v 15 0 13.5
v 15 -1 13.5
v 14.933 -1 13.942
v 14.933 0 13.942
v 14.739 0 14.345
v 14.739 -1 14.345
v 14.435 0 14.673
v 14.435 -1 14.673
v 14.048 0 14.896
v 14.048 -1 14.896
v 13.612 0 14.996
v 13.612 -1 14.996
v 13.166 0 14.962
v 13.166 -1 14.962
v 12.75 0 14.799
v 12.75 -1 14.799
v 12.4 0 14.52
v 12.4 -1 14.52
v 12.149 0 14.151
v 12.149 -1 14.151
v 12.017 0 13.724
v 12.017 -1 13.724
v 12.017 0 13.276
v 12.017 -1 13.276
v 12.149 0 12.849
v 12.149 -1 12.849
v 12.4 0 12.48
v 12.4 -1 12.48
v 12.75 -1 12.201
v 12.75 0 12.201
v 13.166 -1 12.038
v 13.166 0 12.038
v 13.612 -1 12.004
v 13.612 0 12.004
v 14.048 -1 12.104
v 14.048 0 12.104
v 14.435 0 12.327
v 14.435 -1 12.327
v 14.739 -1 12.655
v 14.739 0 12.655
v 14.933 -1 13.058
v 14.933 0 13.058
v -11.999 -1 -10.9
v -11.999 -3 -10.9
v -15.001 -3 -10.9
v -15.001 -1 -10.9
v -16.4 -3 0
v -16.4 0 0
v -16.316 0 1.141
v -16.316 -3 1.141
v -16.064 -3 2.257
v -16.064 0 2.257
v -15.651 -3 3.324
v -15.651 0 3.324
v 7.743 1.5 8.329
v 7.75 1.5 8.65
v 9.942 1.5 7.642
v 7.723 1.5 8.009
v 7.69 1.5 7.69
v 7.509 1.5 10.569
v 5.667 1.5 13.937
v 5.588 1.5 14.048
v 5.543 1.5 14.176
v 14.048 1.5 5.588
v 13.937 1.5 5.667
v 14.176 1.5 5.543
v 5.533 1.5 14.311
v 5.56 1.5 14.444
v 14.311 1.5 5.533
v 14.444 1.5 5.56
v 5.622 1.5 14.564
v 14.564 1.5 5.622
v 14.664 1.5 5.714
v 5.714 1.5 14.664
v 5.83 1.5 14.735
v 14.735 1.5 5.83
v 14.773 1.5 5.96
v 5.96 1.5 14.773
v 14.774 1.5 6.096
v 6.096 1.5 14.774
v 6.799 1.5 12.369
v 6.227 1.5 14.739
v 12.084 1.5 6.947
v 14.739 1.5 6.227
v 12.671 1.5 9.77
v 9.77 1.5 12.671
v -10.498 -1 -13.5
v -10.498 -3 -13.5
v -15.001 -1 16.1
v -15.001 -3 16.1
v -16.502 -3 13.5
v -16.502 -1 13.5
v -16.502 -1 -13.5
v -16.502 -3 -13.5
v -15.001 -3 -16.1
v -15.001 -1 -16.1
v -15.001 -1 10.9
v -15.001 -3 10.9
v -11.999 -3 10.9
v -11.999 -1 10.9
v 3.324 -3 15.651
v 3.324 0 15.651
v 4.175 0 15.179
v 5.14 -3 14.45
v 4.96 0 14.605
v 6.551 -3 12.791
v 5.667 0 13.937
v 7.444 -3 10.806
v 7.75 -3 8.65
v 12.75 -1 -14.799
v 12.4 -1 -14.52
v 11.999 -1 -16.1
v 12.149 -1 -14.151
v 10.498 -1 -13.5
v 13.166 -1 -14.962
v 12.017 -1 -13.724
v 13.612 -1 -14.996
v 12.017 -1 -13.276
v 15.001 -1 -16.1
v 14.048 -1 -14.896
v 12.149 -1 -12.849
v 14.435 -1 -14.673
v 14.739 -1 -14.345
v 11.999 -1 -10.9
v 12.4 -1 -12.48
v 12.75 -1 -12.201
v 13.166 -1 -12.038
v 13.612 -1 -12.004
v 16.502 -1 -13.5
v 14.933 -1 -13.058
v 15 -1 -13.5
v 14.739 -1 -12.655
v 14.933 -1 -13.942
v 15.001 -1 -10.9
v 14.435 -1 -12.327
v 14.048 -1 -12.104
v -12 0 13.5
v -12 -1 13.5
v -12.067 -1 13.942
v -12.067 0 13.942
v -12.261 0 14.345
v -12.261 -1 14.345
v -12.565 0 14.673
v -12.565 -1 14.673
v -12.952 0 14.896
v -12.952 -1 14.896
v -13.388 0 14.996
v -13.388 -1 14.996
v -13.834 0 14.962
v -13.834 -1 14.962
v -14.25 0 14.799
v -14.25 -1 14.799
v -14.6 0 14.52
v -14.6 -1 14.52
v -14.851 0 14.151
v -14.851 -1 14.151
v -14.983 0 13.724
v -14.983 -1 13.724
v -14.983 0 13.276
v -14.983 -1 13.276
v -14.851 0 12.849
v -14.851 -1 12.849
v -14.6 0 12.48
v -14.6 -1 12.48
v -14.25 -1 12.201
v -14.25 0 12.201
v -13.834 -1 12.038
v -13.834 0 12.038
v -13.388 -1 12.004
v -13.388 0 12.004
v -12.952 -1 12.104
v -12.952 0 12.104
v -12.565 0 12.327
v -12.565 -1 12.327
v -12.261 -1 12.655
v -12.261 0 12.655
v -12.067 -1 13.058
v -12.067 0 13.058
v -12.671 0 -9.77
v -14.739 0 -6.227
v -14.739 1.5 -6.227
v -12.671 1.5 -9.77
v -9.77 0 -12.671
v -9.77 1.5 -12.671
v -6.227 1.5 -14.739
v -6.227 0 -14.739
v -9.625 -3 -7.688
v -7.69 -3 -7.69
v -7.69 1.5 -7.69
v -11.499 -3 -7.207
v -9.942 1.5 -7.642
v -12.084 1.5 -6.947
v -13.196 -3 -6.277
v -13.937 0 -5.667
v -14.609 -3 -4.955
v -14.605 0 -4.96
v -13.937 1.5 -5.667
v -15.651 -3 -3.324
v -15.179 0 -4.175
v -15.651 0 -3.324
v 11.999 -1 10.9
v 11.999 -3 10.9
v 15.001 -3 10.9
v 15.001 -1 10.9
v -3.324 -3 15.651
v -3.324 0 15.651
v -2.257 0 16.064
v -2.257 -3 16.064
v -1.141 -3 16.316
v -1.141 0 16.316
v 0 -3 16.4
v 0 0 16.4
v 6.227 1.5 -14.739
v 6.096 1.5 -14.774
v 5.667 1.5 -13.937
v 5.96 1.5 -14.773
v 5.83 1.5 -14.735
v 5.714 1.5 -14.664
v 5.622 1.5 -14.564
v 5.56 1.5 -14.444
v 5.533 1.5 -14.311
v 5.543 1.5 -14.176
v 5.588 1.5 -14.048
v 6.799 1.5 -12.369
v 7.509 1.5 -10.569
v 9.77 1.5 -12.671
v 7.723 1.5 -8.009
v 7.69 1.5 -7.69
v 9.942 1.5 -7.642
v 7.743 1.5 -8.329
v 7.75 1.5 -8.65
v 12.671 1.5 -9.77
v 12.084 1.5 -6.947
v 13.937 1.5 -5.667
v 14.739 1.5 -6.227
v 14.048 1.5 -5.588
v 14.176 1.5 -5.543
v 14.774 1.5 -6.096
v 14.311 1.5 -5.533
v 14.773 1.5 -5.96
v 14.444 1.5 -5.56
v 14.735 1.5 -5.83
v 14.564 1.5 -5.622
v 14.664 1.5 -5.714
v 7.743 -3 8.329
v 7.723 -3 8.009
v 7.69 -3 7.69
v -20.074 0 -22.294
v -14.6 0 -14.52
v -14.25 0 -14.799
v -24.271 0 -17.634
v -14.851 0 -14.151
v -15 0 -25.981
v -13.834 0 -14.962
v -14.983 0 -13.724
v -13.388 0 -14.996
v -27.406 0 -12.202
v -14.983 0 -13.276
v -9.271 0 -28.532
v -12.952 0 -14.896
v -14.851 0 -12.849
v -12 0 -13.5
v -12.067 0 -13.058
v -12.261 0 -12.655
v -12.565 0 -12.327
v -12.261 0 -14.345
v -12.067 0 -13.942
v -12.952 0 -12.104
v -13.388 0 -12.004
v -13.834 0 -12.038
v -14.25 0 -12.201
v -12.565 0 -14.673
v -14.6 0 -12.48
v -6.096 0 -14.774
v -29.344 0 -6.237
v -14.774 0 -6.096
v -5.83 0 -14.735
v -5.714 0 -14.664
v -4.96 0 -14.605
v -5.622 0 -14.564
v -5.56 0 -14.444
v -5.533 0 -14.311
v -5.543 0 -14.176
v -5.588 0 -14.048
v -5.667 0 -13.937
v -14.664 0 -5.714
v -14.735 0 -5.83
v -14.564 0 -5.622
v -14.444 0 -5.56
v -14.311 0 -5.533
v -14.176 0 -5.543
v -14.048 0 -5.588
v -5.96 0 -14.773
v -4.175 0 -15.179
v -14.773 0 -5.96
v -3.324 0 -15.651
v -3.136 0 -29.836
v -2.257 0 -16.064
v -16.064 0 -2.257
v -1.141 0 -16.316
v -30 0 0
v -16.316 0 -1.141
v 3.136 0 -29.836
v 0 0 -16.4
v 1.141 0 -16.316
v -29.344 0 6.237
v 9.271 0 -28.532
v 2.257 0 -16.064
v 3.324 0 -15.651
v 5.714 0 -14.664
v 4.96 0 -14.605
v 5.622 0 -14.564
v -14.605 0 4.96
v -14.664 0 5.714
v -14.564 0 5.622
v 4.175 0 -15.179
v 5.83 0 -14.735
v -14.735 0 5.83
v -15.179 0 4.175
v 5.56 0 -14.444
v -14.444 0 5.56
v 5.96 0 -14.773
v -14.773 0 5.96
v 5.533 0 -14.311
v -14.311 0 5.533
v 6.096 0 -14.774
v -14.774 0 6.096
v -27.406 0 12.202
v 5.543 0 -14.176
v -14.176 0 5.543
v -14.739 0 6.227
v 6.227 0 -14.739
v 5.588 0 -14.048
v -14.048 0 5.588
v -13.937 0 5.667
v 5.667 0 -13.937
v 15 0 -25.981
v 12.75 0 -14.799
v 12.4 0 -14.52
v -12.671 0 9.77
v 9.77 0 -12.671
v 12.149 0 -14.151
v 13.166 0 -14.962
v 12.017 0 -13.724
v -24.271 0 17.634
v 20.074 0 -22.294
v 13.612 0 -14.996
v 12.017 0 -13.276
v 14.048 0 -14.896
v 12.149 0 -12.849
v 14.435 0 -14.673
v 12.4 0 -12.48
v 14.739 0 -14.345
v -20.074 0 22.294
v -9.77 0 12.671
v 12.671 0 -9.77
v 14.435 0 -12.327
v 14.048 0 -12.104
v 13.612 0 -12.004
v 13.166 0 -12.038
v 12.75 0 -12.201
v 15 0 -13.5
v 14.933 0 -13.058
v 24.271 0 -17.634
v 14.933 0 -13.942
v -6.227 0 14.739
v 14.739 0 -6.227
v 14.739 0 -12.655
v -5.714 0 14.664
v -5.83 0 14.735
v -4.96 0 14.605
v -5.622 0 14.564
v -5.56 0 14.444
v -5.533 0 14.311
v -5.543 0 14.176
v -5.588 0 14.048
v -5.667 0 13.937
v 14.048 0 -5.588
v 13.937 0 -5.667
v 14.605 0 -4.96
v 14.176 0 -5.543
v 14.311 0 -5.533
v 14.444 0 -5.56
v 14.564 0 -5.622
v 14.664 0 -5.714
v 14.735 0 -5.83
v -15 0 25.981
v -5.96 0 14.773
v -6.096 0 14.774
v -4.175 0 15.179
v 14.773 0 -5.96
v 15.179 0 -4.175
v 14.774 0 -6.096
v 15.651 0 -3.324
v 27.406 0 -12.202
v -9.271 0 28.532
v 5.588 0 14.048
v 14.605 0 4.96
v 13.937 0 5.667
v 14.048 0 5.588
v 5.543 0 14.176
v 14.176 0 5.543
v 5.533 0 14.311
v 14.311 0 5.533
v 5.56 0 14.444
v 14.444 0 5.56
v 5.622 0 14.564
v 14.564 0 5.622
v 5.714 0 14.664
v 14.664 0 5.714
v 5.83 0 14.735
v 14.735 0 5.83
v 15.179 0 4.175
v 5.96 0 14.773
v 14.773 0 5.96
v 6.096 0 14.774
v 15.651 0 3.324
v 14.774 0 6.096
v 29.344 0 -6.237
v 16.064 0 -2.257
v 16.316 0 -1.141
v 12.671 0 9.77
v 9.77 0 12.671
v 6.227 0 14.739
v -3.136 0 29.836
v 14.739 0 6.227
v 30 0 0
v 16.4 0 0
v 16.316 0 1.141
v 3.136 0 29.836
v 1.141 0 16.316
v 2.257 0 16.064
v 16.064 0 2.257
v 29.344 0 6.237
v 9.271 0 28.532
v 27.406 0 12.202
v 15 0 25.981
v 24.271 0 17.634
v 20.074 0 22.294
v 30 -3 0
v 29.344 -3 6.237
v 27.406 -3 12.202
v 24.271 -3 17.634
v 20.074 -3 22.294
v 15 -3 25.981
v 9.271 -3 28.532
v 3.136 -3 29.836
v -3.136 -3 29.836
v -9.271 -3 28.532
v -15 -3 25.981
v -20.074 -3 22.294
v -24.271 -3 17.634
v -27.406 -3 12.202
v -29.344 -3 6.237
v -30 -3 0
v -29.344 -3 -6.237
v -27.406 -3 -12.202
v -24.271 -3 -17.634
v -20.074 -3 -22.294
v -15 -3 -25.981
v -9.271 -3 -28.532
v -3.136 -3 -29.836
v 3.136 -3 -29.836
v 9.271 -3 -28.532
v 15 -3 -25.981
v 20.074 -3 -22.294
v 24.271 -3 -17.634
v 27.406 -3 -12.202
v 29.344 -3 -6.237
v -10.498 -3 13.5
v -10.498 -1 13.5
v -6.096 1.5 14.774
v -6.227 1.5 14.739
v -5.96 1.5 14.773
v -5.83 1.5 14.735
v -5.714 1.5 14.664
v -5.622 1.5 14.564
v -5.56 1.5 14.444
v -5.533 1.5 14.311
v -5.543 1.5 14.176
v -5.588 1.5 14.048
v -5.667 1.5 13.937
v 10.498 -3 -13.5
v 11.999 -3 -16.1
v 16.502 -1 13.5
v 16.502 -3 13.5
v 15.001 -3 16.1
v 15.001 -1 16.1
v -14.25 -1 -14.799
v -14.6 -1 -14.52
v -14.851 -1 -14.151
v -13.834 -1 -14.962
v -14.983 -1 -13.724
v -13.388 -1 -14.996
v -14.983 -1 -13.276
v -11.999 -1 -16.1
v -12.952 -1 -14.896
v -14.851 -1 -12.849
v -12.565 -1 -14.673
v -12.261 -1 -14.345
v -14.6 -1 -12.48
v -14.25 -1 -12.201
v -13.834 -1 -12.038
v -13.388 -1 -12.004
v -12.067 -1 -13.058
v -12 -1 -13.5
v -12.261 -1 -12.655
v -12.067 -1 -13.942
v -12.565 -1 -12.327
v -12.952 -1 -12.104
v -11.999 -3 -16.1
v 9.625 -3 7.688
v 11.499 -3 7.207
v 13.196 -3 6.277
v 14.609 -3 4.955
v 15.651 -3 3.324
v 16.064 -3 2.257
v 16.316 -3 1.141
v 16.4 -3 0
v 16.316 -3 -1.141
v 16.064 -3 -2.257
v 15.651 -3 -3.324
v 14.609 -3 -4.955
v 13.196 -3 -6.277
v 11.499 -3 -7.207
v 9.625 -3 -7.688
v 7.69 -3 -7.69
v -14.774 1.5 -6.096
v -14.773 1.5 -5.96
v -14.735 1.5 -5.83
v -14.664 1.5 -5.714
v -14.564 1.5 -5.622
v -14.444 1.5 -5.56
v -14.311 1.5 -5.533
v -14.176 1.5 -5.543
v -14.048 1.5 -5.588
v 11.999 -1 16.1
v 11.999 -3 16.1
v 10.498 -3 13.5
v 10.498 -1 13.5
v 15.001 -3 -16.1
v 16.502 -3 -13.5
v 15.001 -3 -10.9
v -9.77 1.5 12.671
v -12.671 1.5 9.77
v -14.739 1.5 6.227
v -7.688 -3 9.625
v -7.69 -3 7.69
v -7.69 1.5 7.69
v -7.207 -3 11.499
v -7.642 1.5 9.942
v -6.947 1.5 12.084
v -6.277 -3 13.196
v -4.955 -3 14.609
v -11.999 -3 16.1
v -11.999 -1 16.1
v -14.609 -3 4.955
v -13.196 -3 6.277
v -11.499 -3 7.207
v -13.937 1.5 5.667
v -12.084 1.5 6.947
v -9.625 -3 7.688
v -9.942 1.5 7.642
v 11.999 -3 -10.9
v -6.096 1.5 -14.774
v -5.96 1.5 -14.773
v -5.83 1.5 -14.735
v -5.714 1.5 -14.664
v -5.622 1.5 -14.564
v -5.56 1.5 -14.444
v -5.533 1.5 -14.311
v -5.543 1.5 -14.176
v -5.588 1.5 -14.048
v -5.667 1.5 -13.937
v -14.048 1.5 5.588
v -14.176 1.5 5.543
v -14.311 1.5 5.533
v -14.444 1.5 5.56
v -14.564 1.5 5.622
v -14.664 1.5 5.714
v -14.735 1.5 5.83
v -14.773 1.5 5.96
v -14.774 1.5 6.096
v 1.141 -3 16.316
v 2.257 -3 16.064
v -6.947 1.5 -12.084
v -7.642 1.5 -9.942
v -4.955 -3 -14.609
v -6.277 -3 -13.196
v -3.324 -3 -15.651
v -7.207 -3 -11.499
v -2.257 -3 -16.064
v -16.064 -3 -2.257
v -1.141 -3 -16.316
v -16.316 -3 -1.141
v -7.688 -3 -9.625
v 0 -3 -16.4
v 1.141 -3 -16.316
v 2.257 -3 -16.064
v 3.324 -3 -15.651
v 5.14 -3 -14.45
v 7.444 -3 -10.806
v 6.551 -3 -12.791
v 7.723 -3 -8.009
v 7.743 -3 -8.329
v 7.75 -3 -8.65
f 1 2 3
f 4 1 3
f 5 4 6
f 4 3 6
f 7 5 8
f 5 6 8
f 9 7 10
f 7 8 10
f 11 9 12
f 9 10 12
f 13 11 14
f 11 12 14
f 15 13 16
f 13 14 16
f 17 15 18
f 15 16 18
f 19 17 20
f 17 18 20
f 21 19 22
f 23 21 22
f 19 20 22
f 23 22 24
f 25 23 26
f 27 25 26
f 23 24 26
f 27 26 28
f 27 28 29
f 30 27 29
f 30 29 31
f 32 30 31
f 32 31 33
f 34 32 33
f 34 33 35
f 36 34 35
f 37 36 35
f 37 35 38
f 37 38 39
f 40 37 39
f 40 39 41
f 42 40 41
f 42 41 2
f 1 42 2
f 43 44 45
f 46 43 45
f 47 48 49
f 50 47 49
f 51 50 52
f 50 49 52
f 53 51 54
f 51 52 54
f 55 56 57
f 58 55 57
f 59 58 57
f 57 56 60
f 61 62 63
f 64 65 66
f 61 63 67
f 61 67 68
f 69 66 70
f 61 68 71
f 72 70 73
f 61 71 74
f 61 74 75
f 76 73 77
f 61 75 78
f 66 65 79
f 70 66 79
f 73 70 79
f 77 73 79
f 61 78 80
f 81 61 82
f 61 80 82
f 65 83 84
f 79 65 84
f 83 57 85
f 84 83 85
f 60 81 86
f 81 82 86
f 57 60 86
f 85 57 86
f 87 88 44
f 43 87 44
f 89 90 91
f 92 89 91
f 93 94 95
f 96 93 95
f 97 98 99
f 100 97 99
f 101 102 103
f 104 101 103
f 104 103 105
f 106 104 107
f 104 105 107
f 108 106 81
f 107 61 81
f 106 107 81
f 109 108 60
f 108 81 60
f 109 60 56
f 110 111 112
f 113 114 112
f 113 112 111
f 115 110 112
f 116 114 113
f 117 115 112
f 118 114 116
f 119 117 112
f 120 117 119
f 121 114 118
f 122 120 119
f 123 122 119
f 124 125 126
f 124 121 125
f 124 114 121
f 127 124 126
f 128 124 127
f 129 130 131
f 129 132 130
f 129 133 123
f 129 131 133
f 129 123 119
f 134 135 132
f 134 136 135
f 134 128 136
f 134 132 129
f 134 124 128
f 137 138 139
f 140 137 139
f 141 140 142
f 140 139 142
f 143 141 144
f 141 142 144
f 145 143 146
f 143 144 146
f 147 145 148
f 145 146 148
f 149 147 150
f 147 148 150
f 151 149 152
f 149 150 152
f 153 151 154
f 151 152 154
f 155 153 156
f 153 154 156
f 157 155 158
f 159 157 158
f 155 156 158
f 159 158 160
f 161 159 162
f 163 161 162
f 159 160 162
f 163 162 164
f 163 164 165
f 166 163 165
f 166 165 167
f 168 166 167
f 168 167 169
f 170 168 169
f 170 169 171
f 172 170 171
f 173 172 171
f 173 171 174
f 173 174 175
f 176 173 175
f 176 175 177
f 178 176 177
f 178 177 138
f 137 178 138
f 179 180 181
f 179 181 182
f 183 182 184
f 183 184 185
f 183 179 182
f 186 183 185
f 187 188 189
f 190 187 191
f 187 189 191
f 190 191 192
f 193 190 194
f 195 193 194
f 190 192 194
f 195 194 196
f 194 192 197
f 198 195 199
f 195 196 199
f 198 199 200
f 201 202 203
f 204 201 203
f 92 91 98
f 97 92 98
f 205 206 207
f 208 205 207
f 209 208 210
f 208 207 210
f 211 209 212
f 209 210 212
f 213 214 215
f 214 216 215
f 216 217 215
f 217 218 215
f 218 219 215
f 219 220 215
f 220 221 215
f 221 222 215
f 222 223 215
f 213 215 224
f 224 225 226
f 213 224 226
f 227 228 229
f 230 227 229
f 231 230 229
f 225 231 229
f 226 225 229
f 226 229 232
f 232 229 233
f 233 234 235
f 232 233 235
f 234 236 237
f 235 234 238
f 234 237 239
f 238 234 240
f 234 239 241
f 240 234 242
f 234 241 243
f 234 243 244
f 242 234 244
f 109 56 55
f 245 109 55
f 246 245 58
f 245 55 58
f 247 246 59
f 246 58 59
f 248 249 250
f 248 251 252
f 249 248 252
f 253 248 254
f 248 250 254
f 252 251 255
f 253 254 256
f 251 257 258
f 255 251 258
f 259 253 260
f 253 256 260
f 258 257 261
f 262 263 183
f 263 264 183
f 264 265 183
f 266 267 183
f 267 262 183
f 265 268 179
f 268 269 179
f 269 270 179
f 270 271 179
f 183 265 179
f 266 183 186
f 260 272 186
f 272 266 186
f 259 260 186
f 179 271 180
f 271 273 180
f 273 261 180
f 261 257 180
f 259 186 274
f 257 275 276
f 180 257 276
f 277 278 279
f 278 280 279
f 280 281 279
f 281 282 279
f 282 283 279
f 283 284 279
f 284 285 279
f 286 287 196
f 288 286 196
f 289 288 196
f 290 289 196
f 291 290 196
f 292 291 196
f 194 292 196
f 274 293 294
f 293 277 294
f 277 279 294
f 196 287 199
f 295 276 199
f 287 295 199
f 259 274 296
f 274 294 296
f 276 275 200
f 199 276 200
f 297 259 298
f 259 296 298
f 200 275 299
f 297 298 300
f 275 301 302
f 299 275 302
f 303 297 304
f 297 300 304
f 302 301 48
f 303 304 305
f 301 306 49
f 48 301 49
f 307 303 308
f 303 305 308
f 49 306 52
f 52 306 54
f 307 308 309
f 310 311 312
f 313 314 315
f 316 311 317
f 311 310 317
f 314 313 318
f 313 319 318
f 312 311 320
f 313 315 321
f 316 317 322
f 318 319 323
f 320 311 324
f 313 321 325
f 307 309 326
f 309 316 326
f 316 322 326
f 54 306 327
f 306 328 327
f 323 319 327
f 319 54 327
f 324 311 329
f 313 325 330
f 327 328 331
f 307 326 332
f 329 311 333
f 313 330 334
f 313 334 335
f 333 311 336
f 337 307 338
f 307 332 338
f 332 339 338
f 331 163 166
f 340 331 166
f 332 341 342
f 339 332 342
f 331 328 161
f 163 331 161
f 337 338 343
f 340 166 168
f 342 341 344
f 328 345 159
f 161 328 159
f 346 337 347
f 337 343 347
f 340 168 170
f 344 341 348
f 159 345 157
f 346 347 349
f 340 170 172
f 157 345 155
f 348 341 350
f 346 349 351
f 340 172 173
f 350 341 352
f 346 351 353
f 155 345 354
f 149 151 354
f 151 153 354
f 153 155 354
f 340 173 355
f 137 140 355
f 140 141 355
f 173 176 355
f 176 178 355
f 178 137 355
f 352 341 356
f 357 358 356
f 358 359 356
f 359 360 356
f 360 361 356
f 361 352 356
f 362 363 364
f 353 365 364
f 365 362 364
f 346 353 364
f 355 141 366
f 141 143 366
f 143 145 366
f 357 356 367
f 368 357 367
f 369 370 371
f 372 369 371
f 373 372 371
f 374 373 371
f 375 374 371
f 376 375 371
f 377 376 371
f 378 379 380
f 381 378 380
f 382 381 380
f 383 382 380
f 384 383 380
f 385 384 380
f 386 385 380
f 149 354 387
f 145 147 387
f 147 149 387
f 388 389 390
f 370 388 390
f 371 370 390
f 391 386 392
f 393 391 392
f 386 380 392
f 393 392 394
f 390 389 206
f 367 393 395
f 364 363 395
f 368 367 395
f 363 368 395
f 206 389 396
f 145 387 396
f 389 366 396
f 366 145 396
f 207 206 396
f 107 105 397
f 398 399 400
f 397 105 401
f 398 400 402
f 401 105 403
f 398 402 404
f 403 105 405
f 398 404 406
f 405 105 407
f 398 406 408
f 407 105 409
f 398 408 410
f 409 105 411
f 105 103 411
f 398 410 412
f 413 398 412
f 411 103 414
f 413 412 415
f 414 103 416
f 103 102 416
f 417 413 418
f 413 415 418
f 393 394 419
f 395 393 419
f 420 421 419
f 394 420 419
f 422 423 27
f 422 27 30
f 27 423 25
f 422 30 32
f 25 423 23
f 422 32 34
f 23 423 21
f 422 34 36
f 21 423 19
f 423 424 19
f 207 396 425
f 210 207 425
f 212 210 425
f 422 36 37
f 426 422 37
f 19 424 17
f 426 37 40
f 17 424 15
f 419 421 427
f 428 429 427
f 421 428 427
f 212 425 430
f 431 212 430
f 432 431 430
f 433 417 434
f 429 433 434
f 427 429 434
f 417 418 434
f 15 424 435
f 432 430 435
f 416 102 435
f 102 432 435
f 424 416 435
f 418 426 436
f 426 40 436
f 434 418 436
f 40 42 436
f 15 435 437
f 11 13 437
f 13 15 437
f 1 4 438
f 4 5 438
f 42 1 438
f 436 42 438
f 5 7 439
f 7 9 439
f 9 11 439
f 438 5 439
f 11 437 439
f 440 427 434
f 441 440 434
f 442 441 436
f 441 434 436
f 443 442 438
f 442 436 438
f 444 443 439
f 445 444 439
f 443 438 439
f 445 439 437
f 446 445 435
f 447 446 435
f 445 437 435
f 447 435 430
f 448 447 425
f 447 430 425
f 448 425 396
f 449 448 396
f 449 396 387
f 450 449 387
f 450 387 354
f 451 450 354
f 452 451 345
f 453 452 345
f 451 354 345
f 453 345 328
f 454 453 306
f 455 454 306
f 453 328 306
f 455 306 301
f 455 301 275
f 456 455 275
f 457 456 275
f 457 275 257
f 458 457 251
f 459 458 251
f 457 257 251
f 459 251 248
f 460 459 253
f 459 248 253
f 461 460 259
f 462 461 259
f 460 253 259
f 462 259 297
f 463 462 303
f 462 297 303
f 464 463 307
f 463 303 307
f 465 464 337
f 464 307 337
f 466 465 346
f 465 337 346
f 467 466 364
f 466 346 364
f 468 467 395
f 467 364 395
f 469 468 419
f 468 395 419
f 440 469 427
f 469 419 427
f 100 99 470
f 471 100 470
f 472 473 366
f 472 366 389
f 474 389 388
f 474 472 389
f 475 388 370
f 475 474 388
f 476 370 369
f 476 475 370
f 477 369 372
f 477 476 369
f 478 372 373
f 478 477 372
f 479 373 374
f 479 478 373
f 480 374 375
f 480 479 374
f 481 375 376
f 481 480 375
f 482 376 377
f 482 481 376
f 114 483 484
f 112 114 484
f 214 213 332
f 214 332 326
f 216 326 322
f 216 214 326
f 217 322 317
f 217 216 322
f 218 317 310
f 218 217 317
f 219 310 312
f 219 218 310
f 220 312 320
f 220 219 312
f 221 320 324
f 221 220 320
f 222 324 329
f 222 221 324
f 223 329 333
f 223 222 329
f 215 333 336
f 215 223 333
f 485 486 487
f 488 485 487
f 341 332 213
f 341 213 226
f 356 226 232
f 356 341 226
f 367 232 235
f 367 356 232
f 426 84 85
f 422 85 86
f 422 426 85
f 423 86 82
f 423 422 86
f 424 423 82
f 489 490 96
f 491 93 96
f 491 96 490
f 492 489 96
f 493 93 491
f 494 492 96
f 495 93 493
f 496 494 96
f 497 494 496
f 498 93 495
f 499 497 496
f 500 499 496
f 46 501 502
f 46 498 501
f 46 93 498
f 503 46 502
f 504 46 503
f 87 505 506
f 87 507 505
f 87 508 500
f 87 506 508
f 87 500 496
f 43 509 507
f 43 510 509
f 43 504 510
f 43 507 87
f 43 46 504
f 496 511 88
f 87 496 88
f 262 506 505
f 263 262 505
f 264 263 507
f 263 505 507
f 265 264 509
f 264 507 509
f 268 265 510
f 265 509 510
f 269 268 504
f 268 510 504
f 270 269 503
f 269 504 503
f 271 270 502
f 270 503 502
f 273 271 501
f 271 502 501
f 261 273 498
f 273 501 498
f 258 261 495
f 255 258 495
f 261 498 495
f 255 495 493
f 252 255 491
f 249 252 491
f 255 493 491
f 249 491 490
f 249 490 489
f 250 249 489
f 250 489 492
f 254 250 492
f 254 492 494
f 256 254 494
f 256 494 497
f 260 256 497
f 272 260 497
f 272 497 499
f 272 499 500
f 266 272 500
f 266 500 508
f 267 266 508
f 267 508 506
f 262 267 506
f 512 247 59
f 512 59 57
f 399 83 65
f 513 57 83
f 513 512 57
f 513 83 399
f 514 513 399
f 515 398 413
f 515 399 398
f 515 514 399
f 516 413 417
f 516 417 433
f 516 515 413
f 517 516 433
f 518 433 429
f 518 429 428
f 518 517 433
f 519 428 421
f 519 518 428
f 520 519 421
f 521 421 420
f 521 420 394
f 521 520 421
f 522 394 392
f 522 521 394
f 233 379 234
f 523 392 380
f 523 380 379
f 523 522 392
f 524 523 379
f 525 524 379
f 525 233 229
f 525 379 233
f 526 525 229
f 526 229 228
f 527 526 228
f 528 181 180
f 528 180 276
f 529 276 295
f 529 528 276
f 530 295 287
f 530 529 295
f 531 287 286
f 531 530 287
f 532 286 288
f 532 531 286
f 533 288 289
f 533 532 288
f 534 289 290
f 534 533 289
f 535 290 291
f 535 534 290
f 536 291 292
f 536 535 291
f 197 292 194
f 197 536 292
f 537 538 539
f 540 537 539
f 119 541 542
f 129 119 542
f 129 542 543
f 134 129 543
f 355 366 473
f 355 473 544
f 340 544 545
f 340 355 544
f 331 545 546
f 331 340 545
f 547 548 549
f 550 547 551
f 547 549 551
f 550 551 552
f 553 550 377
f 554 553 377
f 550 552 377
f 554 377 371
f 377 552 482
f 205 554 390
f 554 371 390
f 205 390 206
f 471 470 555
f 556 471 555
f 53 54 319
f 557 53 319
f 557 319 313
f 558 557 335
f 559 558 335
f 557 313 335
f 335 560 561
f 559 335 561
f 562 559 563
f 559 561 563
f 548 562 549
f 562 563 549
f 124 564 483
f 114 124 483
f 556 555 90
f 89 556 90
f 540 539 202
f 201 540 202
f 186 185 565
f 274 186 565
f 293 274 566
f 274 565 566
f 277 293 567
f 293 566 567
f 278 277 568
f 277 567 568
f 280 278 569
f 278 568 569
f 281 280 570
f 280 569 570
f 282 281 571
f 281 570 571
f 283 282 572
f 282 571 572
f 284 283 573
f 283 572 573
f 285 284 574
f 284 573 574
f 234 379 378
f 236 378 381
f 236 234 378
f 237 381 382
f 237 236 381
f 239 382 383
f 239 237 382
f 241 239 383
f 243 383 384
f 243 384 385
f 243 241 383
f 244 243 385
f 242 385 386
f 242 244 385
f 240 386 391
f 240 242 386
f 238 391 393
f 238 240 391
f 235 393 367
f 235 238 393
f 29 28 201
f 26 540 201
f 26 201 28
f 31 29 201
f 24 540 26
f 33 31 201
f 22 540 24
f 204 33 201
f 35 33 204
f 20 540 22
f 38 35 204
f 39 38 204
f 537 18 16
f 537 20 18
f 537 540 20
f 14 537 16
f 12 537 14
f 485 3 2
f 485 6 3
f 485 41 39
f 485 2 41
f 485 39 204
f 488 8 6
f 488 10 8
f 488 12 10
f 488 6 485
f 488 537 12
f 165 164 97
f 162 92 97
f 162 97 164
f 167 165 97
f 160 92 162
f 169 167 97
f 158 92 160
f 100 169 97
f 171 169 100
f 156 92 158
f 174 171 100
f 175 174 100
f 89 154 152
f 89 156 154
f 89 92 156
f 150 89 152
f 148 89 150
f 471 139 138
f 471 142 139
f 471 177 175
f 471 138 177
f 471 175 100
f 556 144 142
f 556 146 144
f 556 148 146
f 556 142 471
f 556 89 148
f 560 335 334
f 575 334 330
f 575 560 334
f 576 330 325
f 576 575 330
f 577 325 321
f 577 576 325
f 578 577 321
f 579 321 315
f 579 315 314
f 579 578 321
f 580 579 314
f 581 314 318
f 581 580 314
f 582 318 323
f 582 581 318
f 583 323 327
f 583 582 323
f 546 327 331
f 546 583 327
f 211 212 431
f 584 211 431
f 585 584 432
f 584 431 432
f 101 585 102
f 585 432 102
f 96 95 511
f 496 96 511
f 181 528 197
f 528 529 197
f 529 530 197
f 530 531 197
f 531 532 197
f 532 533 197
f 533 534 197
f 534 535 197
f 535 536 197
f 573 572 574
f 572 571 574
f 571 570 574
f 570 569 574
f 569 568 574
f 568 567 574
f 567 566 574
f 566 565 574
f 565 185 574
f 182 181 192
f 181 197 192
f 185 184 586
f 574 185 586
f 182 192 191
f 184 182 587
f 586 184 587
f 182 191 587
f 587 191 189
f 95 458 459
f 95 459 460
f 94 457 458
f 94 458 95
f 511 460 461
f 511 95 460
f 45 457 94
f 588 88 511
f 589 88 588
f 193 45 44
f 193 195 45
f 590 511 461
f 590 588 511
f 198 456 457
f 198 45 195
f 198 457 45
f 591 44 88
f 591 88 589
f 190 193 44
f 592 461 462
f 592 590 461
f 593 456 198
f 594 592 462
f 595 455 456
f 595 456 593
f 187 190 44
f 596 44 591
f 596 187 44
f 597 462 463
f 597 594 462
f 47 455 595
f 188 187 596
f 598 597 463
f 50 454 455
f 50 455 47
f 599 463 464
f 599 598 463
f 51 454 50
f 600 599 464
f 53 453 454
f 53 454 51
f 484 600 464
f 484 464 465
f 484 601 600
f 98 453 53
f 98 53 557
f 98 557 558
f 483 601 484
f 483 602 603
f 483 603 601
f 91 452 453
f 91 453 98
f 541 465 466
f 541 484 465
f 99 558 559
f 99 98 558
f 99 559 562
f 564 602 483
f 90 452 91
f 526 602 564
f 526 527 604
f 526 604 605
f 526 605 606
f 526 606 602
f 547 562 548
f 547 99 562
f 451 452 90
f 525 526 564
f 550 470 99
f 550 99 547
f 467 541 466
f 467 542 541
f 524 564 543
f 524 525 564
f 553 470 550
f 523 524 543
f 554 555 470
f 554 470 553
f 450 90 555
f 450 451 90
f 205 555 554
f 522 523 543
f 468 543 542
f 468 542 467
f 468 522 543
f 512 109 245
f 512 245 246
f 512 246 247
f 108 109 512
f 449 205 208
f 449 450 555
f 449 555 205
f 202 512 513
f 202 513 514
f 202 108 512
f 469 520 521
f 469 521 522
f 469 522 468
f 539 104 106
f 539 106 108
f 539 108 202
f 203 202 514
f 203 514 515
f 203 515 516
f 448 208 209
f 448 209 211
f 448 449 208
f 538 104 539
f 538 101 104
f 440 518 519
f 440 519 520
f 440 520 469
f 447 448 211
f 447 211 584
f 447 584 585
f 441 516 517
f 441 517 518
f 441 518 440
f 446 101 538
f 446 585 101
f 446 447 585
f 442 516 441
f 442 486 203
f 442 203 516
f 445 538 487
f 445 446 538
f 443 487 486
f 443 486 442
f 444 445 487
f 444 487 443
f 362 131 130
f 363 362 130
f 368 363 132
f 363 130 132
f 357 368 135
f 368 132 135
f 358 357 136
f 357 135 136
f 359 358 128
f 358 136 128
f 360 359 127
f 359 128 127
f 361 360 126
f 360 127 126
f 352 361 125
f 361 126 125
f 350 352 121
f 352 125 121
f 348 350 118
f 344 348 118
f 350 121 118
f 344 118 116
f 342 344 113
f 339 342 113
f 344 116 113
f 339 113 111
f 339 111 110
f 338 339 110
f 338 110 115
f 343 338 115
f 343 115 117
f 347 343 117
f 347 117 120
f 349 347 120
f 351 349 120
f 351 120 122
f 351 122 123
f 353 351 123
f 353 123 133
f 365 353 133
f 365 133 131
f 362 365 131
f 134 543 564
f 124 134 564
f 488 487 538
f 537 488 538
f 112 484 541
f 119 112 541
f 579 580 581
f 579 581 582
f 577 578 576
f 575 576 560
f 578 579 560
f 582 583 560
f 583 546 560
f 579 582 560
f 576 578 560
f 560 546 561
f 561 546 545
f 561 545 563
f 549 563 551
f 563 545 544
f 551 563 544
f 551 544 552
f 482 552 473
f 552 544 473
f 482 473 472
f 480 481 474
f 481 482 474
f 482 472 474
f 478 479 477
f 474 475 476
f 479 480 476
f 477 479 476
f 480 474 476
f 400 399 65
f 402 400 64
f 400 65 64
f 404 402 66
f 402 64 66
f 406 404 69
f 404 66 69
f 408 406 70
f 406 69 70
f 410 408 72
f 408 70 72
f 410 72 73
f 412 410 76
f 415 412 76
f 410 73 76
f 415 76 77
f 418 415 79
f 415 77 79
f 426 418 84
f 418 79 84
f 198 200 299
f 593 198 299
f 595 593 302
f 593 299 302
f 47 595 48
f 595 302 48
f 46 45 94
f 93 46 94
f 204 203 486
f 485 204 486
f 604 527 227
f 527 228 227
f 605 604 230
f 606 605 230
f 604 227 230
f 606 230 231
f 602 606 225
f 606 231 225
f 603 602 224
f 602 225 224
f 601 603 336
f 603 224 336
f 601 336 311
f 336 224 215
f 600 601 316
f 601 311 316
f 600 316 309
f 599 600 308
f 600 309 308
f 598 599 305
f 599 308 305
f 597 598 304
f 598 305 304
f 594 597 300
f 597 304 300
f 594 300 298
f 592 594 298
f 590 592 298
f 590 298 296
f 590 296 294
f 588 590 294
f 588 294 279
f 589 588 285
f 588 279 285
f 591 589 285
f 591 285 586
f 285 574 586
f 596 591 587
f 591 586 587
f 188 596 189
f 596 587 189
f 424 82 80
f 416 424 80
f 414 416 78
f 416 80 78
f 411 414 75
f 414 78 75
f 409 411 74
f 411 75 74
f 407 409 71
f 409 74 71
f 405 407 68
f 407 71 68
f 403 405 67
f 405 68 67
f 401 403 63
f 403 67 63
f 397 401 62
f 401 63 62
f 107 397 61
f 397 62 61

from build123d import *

# Parameters (mm, degrees)
F0_R        = 30
F1_DEPTH    = 3
F4_DEPTH    = 1.5
F5_T1_DEPTH = 9.1064563612
F2_R        = 1.5
F3_DEPTH    = 2
F6_DEPTH    = 25


# Not quite as in the source:
# - a fillet or chamfer that OpenCascade refuses, or shapes differently, is made with other operations: its cross-section is extruded or revolved along the edge and cut away or added


with BuildPart() as f1:
    # F0 (on Front) → F1 (new body)
    with BuildSketch(Plane.XZ):
        Circle(F0_R)
        with BuildLine():
            ThreePointArc((0, 16.4), (11.5965512115, 11.5965512115), (16.4, 0))
            ThreePointArc((16.4, 0), (11.5965511405, -11.5965512824), (-2.007e-07, -16.4))
            ThreePointArc((-2.007e-07, -16.4), (-11.5965512889, -11.596551134), (-16.4, 1.83e-08))
            ThreePointArc((-16.4, 1.83e-08), (-11.596551205, 11.5965512179), (0, 16.4))
        make_face(mode=Mode.SUBTRACT)
        with BuildLine():
            ThreePointArc((7.6903565933, 7.6903565933), (12.3769167702, 6.7950416767), (15.650867052, 3.3242082546))
            ThreePointArc((15.650867052, 3.3242082546), (11.313708499, 11.313708499), (3.3242082546, 15.650867052))
            ThreePointArc((3.3242082546, 15.650867052), (6.5507676639, 12.7912489678), (7.75, 8.65))
            ThreePointArc((7.75, 8.65), (7.7350747766, 8.1692524561), (7.6903565933, 7.6903565933))
        make_face()
        with BuildLine():
            ThreePointArc((3.3242082546, -15.650867052), (11.313708499, -11.313708499), (15.650867052, -3.3242082546))
            ThreePointArc((15.650867052, -3.3242082546), (12.3769167702, -6.7950416767), (7.6903565933, -7.6903565933))
            ThreePointArc((7.6903565933, -7.6903565933), (7.7350747766, -8.1692524561), (7.75, -8.65))
            ThreePointArc((7.75, -8.65), (6.5507676639, -12.7912489678), (3.3242082546, -15.650867052))
        make_face()
        with BuildLine():
            ThreePointArc((-7.6903565933, 7.6903565933), (-6.7950416767, 12.3769167702), (-3.3242082546, 15.650867052))
            ThreePointArc((-3.3242082546, 15.650867052), (-11.313708499, 11.313708499), (-15.650867052, 3.3242082546))
            ThreePointArc((-15.650867052, 3.3242082546), (-12.3769167702, 6.7950416767), (-7.6903565933, 7.6903565933))
        make_face()
        with BuildLine():
            ThreePointArc((-15.650867052, -3.3242082546), (-11.313708499, -11.313708499), (-3.3242082546, -15.650867052))
            ThreePointArc((-3.3242082546, -15.650867052), (-6.7950416767, -12.3769167702), (-7.6903565933, -7.6903565933))
            ThreePointArc((-7.6903565933, -7.6903565933), (-12.3769167702, -6.7950416767), (-15.650867052, -3.3242082546))
        make_face()
        with BuildLine():
            ThreePointArc((15.650867052, 3.3242082546), (16.2103974649, 1.7037870094), (16.4, 0))
            ThreePointArc((16.4, 0), (11.5965512115, 11.5965512115), (0, 16.4))
            ThreePointArc((0, 16.4), (1.7037870094, 16.2103974649), (3.3242082546, 15.650867052))
            ThreePointArc((3.3242082546, 15.650867052), (11.313708499, 11.313708499), (15.650867052, 3.3242082546))
        make_face()
        with BuildLine():
            ThreePointArc((-2.007e-07, -16.4), (11.5965511405, -11.5965512824), (16.4, 0))
            ThreePointArc((16.4, 0), (16.2103974649, -1.7037870094), (15.650867052, -3.3242082546))
            ThreePointArc((15.650867052, -3.3242082546), (11.313708499, -11.313708499), (3.3242082546, -15.650867052))
            ThreePointArc((3.3242082546, -15.650867052), (1.7037869115, -16.2103974869), (-2.007e-07, -16.4))
        make_face()
        with BuildLine():
            ThreePointArc((-3.3242082546, 15.650867052), (-1.7037870094, 16.2103974649), (0, 16.4))
            ThreePointArc((0, 16.4), (-11.596551205, 11.5965512179), (-16.4, 1.83e-08))
            ThreePointArc((-16.4, 1.83e-08), (-16.2103974628, 1.7037870183), (-15.650867052, 3.3242082546))
            ThreePointArc((-15.650867052, 3.3242082546), (-11.313708499, 11.313708499), (-3.3242082546, 15.650867052))
        make_face()
        with BuildLine():
            ThreePointArc((-16.4, 1.83e-08), (-11.5965512889, -11.596551134), (-2.007e-07, -16.4))
            ThreePointArc((-2.007e-07, -16.4), (-1.7037871073, -16.2103974428), (-3.3242082546, -15.650867052))
            ThreePointArc((-3.3242082546, -15.650867052), (-11.313708499, -11.313708499), (-15.650867052, -3.3242082546))
            ThreePointArc((-15.650867052, -3.3242082546), (-16.2103974669, -1.7037870005), (-16.4, 1.83e-08))
        make_face()
    extrude(amount=F1_DEPTH)

    # F0 (on Front) → F4 (join)
    with BuildSketch(Plane.XZ):
        with BuildLine():
            ThreePointArc((7.6903565933, 7.6903565933), (12.3769167702, 6.7950416767), (15.650867052, 3.3242082546))
            ThreePointArc((15.650867052, 3.3242082546), (11.313708499, 11.313708499), (3.3242082546, 15.650867052))
            ThreePointArc((3.3242082546, 15.650867052), (6.5507676639, 12.7912489678), (7.75, 8.65))
            ThreePointArc((7.75, 8.65), (7.7350747766, 8.1692524561), (7.6903565933, 7.6903565933))
        make_face()
        with BuildLine():
            ThreePointArc((3.3242082546, -15.650867052), (11.313708499, -11.313708499), (15.650867052, -3.3242082546))
            ThreePointArc((15.650867052, -3.3242082546), (12.3769167702, -6.7950416767), (7.6903565933, -7.6903565933))
            ThreePointArc((7.6903565933, -7.6903565933), (7.7350747766, -8.1692524561), (7.75, -8.65))
            ThreePointArc((7.75, -8.65), (6.5507676639, -12.7912489678), (3.3242082546, -15.650867052))
        make_face()
        with BuildLine():
            ThreePointArc((-7.6903565933, 7.6903565933), (-6.7950416767, 12.3769167702), (-3.3242082546, 15.650867052))
            ThreePointArc((-3.3242082546, 15.650867052), (-11.313708499, 11.313708499), (-15.650867052, 3.3242082546))
            ThreePointArc((-15.650867052, 3.3242082546), (-12.3769167702, 6.7950416767), (-7.6903565933, 7.6903565933))
        make_face()
        with BuildLine():
            ThreePointArc((-15.650867052, -3.3242082546), (-11.313708499, -11.313708499), (-3.3242082546, -15.650867052))
            ThreePointArc((-3.3242082546, -15.650867052), (-6.7950416767, -12.3769167702), (-7.6903565933, -7.6903565933))
            ThreePointArc((-7.6903565933, -7.6903565933), (-12.3769167702, -6.7950416767), (-15.650867052, -3.3242082546))
        make_face()
    extrude(amount=-F4_DEPTH)

    # F5: fillet of radius 0.5 on 8 edges, made by hand

    # F5_s2 → F5_t1 (cut)
    with BuildSketch(Plane.XZ.offset(-9.1064563612)):
        with BuildLine():
            ThreePointArc((-6.2268118052, -14.738616446), (-5.6223691009, -14.5644243012), (-5.6666346068, -13.936941671))
            ThreePointArc((-5.6666346068, -13.936941671), (-4.5763739896, -14.9045424379), (-3.3242082546, -15.650867052))
            ThreePointArc((-3.3242082546, -15.650867052), (-4.7972436187, -15.263893791), (-6.2268118052, -14.738616446))
        make_face()
        with BuildLine():
            ThreePointArc((6.2268118052, -14.738616446), (5.6223691009, -14.5644243012), (5.6666346068, -13.936941671))
            ThreePointArc((5.6666346068, -13.936941671), (4.5763739896, -14.9045424379), (3.3242082546, -15.650867052))
            ThreePointArc((3.3242082546, -15.650867052), (4.7972436187, -15.263893791), (6.2268118052, -14.738616446))
        make_face()
        with BuildLine():
            ThreePointArc((13.936941671, 5.6666346068), (14.5644243012, 5.6223691009), (14.738616446, 6.2268118052))
            ThreePointArc((14.738616446, 6.2268118052), (15.263893791, 4.7972436187), (15.650867052, 3.3242082546))
            ThreePointArc((15.650867052, 3.3242082546), (14.9045424379, 4.5763739896), (13.936941671, 5.6666346068))
        make_face()
        with BuildLine():
            ThreePointArc((13.936941671, -5.6666346068), (14.5644243012, -5.6223691009), (14.738616446, -6.2268118052))
            ThreePointArc((14.738616446, -6.2268118052), (15.263893791, -4.7972436187), (15.650867052, -3.3242082546))
            ThreePointArc((15.650867052, -3.3242082546), (14.9045424379, -4.5763739896), (13.936941671, -5.6666346068))
        make_face()
        with BuildLine():
            ThreePointArc((-13.936941671, 5.6666346068), (-14.5644243012, 5.6223691009), (-14.738616446, 6.2268118052))
            ThreePointArc((-14.738616446, 6.2268118052), (-15.263893791, 4.7972436187), (-15.650867052, 3.3242082546))
            ThreePointArc((-15.650867052, 3.3242082546), (-14.9045424379, 4.5763739896), (-13.936941671, 5.6666346068))
        make_face()
        with BuildLine():
            ThreePointArc((-14.738616446, -6.2268118052), (-14.5644243012, -5.6223691009), (-13.936941671, -5.6666346068))
            ThreePointArc((-13.936941671, -5.6666346068), (-14.9045424379, -4.5763739896), (-15.650867052, -3.3242082546))
            ThreePointArc((-15.650867052, -3.3242082546), (-15.263893791, -4.7972436187), (-14.738616446, -6.2268118052))
        make_face()
        with BuildLine():
            ThreePointArc((6.2268118052, 14.738616446), (5.6223691009, 14.5644243012), (5.6666346068, 13.936941671))
            ThreePointArc((5.6666346068, 13.936941671), (4.5763739896, 14.9045424379), (3.3242082546, 15.650867052))
            ThreePointArc((3.3242082546, 15.650867052), (4.7972436187, 15.263893791), (6.2268118052, 14.738616446))
        make_face()
        with BuildLine():
            ThreePointArc((-6.2268118052, 14.738616446), (-5.6223691009, 14.5644243012), (-5.6666346068, 13.936941671))
            ThreePointArc((-5.6666346068, 13.936941671), (-4.5763739896, 14.9045424379), (-3.3242082546, 15.650867052))
            ThreePointArc((-3.3242082546, 15.650867052), (-4.7972436187, 15.263893791), (-6.2268118052, 14.738616446))
        make_face()
    extrude(amount=F5_T1_DEPTH, mode=Mode.SUBTRACT)

    # F2 (on face) → F3 (cut)
    with BuildSketch(Plane.XZ.offset(3)):
        Polygon((-15.0011106999, 10.9), (-11.9988893001, 10.9), (-10.4977786002, 13.5), (-11.9988893001, 16.1), (-15.0011106999, 16.1), (-16.5022213998, 13.5), align=None)
        with Locations((-13.5, 13.5)):
            Circle(F2_R, mode=Mode.SUBTRACT)
        Polygon((11.9988893001, 10.9), (15.0011106999, 10.9), (16.5022213998, 13.5), (15.0011106999, 16.1), (11.9988893001, 16.1), (10.4977786002, 13.5), align=None)
        with Locations((13.5, 13.5)):
            Circle(F2_R, mode=Mode.SUBTRACT)
        Polygon((-11.9988893001, -10.9), (-15.0011106999, -10.9), (-16.5022213998, -13.5), (-15.0011106999, -16.1), (-11.9988893001, -16.1), (-10.4977786002, -13.5), align=None)
        with Locations((-13.5, -13.5)):
            Circle(F2_R, mode=Mode.SUBTRACT)
        Polygon((15.0011106999, -10.9), (11.9988893001, -10.9), (10.4977786002, -13.5), (11.9988893001, -16.1), (15.0011106999, -16.1), (16.5022213998, -13.5), align=None)
        with Locations((13.5, -13.5)):
            Circle(F2_R, mode=Mode.SUBTRACT)
    extrude(amount=-F3_DEPTH, mode=Mode.SUBTRACT)

    # F2 (on face) → F6 (cut)
    with BuildSketch(Plane.XZ.offset(3)):
        with Locations((-13.5, 13.5)):
            Circle(F2_R)
        with Locations((13.5, 13.5)):
            Circle(F2_R)
        with Locations((13.5, -13.5)):
            Circle(F2_R)
        with Locations((-13.5, -13.5)):
            Circle(F2_R)
    extrude(amount=-F6_DEPTH, mode=Mode.SUBTRACT)


solid = f1.part
